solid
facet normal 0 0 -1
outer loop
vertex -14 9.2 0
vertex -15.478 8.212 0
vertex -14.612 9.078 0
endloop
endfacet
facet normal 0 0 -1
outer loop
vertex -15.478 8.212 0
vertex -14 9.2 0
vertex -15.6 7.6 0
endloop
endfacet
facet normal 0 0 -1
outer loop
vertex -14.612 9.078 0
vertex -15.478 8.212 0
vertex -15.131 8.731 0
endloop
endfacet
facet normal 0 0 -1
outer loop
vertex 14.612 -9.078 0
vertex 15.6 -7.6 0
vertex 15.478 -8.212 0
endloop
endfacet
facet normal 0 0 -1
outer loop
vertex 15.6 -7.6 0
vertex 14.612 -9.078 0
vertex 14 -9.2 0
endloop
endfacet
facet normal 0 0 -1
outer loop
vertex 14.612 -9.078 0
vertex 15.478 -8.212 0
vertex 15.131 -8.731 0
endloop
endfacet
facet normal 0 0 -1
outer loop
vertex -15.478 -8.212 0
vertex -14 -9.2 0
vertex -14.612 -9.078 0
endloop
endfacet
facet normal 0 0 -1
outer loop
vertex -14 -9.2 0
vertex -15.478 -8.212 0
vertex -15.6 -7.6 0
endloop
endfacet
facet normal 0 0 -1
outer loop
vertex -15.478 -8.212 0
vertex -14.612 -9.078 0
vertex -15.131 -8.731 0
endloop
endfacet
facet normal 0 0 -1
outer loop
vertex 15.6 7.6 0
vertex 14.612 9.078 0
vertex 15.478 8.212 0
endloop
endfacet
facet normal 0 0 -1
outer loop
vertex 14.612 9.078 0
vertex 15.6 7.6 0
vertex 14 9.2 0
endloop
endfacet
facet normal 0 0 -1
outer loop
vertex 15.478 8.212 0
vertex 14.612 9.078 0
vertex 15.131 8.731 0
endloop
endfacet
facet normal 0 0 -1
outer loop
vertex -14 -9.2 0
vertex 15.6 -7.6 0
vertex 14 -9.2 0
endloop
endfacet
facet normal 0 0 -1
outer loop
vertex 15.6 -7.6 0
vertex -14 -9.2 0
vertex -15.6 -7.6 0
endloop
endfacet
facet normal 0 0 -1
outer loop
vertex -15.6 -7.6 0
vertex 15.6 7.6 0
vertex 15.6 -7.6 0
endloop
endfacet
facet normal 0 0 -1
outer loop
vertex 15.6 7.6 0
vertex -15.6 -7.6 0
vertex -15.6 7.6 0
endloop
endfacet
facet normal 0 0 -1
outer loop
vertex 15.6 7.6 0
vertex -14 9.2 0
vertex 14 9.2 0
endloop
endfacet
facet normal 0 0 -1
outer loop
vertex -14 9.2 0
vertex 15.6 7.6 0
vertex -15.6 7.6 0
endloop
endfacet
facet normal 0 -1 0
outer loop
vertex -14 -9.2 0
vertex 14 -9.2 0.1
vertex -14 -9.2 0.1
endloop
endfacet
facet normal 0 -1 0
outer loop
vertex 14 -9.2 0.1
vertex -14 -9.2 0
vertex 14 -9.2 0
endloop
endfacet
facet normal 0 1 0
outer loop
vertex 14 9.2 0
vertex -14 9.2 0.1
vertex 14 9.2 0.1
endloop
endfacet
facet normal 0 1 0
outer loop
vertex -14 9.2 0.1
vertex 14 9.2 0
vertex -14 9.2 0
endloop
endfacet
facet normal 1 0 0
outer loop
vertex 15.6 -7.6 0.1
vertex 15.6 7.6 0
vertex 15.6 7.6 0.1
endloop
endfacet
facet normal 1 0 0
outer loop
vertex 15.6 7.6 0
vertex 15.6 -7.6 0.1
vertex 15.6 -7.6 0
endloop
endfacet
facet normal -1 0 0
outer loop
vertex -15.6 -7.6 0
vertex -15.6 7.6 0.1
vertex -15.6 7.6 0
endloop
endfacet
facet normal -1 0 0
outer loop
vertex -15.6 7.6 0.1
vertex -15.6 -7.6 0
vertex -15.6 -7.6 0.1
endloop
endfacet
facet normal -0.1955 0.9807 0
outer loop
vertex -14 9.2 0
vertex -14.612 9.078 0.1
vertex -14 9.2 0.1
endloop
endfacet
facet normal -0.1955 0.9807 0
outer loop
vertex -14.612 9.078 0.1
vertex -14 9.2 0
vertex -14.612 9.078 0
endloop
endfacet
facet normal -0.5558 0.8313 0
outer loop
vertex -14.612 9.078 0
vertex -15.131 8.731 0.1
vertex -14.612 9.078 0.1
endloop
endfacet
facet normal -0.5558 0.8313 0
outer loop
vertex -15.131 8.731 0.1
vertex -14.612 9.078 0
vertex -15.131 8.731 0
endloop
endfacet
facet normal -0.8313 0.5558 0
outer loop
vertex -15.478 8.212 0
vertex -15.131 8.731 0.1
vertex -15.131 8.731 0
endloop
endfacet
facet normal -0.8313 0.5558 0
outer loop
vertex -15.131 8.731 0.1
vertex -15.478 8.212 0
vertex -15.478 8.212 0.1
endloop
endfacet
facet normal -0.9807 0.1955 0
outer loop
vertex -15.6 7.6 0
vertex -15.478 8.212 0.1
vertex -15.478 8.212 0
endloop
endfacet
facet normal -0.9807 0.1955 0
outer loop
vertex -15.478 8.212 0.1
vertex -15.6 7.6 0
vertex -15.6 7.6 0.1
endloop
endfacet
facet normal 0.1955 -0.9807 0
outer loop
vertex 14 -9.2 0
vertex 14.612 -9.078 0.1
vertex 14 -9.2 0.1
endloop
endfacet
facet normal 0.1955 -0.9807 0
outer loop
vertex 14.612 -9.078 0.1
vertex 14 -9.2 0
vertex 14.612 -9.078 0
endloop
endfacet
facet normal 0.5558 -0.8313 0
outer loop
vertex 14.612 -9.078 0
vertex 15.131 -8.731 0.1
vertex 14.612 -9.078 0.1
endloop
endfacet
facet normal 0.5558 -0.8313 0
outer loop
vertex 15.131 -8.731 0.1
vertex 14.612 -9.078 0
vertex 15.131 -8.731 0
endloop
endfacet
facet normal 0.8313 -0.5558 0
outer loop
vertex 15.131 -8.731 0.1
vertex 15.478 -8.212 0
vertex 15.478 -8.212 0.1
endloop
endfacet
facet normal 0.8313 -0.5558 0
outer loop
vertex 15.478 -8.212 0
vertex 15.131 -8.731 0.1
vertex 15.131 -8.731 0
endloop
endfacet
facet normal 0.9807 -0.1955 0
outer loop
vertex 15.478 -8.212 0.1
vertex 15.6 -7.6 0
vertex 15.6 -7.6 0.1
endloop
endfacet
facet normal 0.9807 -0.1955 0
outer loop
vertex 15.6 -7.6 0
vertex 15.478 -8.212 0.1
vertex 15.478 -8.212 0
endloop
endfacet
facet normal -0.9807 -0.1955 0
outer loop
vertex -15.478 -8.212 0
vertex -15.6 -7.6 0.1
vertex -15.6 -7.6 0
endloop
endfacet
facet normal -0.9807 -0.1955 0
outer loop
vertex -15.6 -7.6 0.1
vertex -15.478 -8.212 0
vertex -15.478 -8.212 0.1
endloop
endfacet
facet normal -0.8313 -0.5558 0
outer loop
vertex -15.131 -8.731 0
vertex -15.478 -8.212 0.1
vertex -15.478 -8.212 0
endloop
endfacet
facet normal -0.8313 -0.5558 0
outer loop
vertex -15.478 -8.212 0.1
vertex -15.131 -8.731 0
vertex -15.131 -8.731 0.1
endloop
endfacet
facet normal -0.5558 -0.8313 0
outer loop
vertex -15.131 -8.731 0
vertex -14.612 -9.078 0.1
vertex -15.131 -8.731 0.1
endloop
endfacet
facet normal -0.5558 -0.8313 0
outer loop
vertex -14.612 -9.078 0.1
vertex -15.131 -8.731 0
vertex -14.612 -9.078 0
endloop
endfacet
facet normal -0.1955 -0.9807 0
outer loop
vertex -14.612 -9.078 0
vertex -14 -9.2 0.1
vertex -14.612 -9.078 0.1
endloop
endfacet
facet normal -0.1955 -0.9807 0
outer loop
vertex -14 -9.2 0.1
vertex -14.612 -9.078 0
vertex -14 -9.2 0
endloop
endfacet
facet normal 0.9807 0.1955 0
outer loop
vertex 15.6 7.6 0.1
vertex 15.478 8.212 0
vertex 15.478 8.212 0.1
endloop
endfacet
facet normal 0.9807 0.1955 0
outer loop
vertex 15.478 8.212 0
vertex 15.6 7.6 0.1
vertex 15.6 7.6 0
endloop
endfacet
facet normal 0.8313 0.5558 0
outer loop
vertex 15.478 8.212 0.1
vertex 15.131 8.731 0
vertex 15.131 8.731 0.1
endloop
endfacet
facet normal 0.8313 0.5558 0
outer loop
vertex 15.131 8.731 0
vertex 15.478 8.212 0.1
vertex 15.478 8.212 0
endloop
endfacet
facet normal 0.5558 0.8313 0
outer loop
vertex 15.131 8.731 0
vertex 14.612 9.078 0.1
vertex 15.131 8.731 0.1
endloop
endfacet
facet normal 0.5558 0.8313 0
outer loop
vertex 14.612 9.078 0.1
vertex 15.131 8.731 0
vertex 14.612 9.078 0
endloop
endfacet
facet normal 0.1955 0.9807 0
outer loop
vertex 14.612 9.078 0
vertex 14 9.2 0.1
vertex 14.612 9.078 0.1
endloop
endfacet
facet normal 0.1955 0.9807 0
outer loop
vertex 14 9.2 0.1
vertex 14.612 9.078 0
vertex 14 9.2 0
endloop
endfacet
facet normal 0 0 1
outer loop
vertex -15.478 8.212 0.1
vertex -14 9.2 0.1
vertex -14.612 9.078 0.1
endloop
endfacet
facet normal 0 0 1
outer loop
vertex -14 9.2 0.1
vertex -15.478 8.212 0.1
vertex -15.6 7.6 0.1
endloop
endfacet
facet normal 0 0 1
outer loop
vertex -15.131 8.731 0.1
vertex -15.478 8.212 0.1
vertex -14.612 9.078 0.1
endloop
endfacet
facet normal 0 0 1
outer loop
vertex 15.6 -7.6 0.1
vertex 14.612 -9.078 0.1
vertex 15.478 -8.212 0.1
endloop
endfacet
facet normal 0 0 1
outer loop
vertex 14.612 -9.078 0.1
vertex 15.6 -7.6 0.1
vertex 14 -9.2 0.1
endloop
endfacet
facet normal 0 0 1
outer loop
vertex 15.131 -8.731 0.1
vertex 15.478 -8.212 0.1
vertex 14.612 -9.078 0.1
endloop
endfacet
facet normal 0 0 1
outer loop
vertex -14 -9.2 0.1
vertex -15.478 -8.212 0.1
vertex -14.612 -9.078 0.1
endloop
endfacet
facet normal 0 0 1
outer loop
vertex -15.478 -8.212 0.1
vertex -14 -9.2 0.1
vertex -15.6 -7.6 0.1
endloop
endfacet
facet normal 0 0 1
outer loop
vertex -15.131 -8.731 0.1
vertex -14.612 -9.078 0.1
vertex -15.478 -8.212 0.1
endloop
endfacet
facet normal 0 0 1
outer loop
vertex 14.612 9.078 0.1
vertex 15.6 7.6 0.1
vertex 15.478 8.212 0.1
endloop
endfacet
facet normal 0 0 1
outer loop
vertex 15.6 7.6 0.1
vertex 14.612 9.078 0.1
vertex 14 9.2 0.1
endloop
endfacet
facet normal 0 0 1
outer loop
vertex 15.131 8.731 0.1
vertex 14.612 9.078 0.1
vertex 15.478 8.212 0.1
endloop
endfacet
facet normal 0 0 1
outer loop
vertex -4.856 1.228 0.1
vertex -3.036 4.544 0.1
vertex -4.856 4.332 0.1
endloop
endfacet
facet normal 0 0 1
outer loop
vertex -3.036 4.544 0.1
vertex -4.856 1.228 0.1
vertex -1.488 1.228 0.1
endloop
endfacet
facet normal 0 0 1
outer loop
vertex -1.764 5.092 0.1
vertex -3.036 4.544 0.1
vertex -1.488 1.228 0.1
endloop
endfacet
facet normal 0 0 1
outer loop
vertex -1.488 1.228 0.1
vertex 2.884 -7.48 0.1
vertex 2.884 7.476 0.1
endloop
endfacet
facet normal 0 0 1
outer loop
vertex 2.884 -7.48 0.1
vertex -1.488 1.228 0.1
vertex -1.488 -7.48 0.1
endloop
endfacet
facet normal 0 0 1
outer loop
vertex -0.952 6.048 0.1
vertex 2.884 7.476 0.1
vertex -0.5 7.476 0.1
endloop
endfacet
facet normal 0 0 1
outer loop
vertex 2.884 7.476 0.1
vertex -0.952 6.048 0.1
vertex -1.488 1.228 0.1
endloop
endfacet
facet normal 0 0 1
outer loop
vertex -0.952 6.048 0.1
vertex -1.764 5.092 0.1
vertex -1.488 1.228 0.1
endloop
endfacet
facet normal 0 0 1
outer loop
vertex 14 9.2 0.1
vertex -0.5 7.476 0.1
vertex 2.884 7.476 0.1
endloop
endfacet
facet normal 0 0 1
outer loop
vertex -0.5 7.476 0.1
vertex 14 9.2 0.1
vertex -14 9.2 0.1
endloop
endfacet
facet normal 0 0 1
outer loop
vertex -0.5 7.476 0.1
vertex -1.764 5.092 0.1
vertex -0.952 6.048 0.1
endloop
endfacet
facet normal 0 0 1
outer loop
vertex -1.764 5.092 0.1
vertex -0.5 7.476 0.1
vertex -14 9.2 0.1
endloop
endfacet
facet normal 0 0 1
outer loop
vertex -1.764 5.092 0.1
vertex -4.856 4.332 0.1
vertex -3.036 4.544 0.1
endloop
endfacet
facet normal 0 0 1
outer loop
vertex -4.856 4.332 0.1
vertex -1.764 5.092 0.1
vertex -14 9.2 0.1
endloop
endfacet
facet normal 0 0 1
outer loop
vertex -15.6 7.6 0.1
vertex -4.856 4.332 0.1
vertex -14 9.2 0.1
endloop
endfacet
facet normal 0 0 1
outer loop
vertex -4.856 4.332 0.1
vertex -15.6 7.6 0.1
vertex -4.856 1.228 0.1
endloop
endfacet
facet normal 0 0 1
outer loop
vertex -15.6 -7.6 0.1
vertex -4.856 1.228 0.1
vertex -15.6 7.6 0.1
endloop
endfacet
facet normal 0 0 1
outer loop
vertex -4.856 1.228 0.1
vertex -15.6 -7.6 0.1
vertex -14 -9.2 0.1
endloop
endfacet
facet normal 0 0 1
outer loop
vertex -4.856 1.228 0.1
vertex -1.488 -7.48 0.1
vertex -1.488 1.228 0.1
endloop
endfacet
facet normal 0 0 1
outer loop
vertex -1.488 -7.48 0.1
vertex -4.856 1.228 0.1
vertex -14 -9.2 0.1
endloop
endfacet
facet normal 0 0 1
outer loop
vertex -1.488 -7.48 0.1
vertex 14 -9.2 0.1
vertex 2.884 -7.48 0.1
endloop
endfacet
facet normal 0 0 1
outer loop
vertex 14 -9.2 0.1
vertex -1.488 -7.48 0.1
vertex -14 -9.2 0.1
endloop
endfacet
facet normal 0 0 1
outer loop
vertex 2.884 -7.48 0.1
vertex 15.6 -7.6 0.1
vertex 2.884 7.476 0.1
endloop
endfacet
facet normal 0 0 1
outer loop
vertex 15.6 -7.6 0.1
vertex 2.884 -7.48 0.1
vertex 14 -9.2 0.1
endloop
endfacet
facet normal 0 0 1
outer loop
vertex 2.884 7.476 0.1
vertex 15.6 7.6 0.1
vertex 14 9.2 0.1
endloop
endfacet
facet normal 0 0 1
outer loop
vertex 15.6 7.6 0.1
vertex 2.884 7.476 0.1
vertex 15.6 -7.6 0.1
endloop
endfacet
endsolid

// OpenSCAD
// file: ../p/1-4cyli.scad
use <../lib.scad>
function ldraw_lib__1_4cyli() = [
// 0 Cylinder 0.25
// 0 Name: 1-4cyli.dat
// 0 Author: James Jessiman
// 0 !LDRAW_ORG Primitive UPDATE 2012-01
// 0 !LICENSE Licensed under CC BY 2.0 and CC BY 4.0 : see CAreadme.txt
// 
// 0 BFC CERTIFY CCW
  [0,"BFC","CERTIFY"],
  [0,"BFC","CCW"],
// 
// 0 !HISTORY 2002-03-23 [sbliss] Added BFC statement.
// 0 !HISTORY 2002-04-25 [PTadmin] Official Update 2002-02
// 0 !HISTORY 2007-06-22 [PTadmin] Header formatted for Contributor Agreement
// 0 !HISTORY 2008-07-01 [PTadmin] Official Update 2008-01
// 0 !HISTORY 2012-02-16 [Philo] Changed to CCW
// 0 !HISTORY 2012-03-30 [PTadmin] Official Update 2012-01
// 
// 
// 4 16 1 1 0 0.9239 1 0.3827 0.9239 0 0.3827 1 0 0
  [4,16,1,1,0,0.9239,1,0.3827,0.9239,0,0.3827,1,0,0],
// 5 24 1 0 0 1 1 0 0.9239 0 0.3827 1 0 -1
  [5,24,1,0,0,1,1,0,0.9239,0,0.3827,1,0,-1],
// 4 16 0.9239 1 0.3827 0.7071 1 0.7071 0.7071 0 0.7071 0.9239 0 0.3827
  [4,16,0.9239,1,0.3827,0.7071,1,0.7071,0.7071,0,0.7071,0.9239,0,0.3827],
// 5 24 0.9239 0 0.3827 0.9239 1 0.3827 0.7071 0 0.7071 1 0 0
  [5,24,0.9239,0,0.3827,0.9239,1,0.3827,0.7071,0,0.7071,1,0,0],
// 4 16 0.7071 1 0.7071 0.3827 1 0.9239 0.3827 0 0.9239 0.7071 0 0.7071
  [4,16,0.7071,1,0.7071,0.3827,1,0.9239,0.3827,0,0.9239,0.7071,0,0.7071],
// 5 24 0.7071 0 0.7071 0.7071 1 0.7071 0.3827 0 0.9239 0.9239 0 0.3827
  [5,24,0.7071,0,0.7071,0.7071,1,0.7071,0.3827,0,0.9239,0.9239,0,0.3827],
// 4 16 0.3827 1 0.9239 0 1 1 0 0 1 0.3827 0 0.9239
  [4,16,0.3827,1,0.9239,0,1,1,0,0,1,0.3827,0,0.9239],
// 5 24 0.3827 0 0.9239 0.3827 1 0.9239 0 0 1 0.7071 0 0.7071
  [5,24,0.3827,0,0.9239,0.3827,1,0.9239,0,0,1,0.7071,0,0.7071],
// 5 24 0 0 1 0 1 1 0.3827 0 0.9239 -1 0 1
  [5,24,0,0,1,0,1,1,0.3827,0,0.9239,-1,0,1],
];
module ldraw_lib__1_4cyli(step=0, col=false, unit=2/5, alt=false, line=0.2, solid=!$preview)
    makepoly(ldraw_lib__1_4cyli(), step=step, col=col, unit=unit, alt=alt, line=line, solid=solid);
ldraw_lib__1_4cyli(line=0.2);
// file: ../p/1-4chrd.scad
use <../lib.scad>
function ldraw_lib__1_4chrd() = [
// 0 Chord 0.25
// 0 Name: 1-4chrd.dat
// 0 Author: Tony Hafner [hafhead]
// 0 !LDRAW_ORG Primitive UPDATE 2012-02
// 0 !LICENSE Licensed under CC BY 2.0 and CC BY 4.0 : see CAreadme.txt
// 
// 0 BFC CERTIFY CCW
  [0,"BFC","CERTIFY"],
  [0,"BFC","CCW"],
// 
// 0 !HISTORY 2004-04-22 [PTadmin] Official Update 2004-02
// 0 !HISTORY 2007-10-09 [PTadmin] Header formatted for Contributor Agreement
// 0 !HISTORY 2008-07-01 [PTadmin] Official Update 2008-01
// 0 !HISTORY 2012-08-02 [MMR1988] Re-creation with PrimGen2 and Rectifier
// 0 !HISTORY 2012-08-09 [PTadmin] Official Update 2012-02
// 
// 
// 4 16 0.9239 0 0.3827 0.3827 0 0.9239 0 0 1 1 0 0
  [4,16,0.9239,0,0.3827,0.3827,0,0.9239,0,0,1,1,0,0],
// 3 16 0.7071 0 0.7071 0.3827 0 0.9239 0.9239 0 0.3827
  [3,16,0.7071,0,0.7071,0.3827,0,0.9239,0.9239,0,0.3827],
];
module ldraw_lib__1_4chrd(step=0, col=false, unit=2/5, alt=false, line=0.2, solid=!$preview)
    makepoly(ldraw_lib__1_4chrd(), step=step, col=col, unit=unit, alt=alt, line=line, solid=solid);
ldraw_lib__1_4chrd(line=0.2);
// main file
use <../lib.scad>
use <../p/1-4chrd.scad>
use <../p/1-4cyli.scad>
function ldraw_lib__004462b() = [
// 0 Sticker  2.3 x  3.9 Rounded Rectangle with Black "1" on White Background
// 0 Name: 004462b.dat
// 0 Author: Takeshi Takahashi [RainbowDolphin]
// 0 !LDRAW_ORG Part UPDATE 2022-06
// 0 !LICENSE Licensed under CC BY 2.0 and CC BY 4.0 : see CAreadme.txt
// 
// 0 BFC CERTIFY CCW
  [0,"BFC","CERTIFY"],
  [0,"BFC","CCW"],
// 
// 0 !KEYWORDS Bricklink 392.1stk01, Brickowl 792264, Formula 1, Racer
// 0 !KEYWORDS Rebrickable 004462, Set 392-1
// 
// 0 !HISTORY 2022-12-20 [PTadmin] Official Update 2022-06
// 
// 
// 1 16 -35 0 19 0 0 -4 0 -1 0 4 0 0 1-4chrd.dat
  [1,16,-35,0,19,0,0,-4,0,-1,0,4,0,0, ldraw_lib__1_4chrd()],
// 1 16 35 0 -19 0 0 4 0 -1 0 -4 0 0 1-4chrd.dat
  [1,16,35,0,-19,0,0,4,0,-1,0,-4,0,0, ldraw_lib__1_4chrd()],
// 1 16 -35 0 -19 -4 0 0 0 -1 0 0 0 -4 1-4chrd.dat
  [1,16,-35,0,-19,-4,0,0,0,-1,0,0,0,-4, ldraw_lib__1_4chrd()],
// 1 16 35 0 19 4 0 0 0 -1 0 0 0 4 1-4chrd.dat
  [1,16,35,0,19,4,0,0,0,-1,0,0,0,4, ldraw_lib__1_4chrd()],
// 4 16 39 0 -19 35 0 -23 -35 0 -23 -39 0 -19
  [4,16,39,0,-19,35,0,-23,-35,0,-23,-39,0,-19],
// 4 16 39 0 19 39 0 -19 -39 0 -19 -39 0 19
  [4,16,39,0,19,39,0,-19,-39,0,-19,-39,0,19],
// 4 16 35 0 23 39 0 19 -39 0 19 -35 0 23
  [4,16,35,0,23,39,0,19,-39,0,19,-35,0,23],
// 4 16 -35 -.25 -23 -35 0 -23 35 0 -23 35 -.25 -23
  [4,16,-35,-.25,-23,-35,0,-23,35,0,-23,35,-.25,-23],
// 4 16 35 0 23 -35 0 23 -35 -.25 23 35 -.25 23
  [4,16,35,0,23,-35,0,23,-35,-.25,23,35,-.25,23],
// 4 16 39 -.25 -19 39 0 -19 39 0 19 39 -.25 19
  [4,16,39,-.25,-19,39,0,-19,39,0,19,39,-.25,19],
// 4 16 -39 0 19 -39 0 -19 -39 -.25 -19 -39 -.25 19
  [4,16,-39,0,19,-39,0,-19,-39,-.25,-19,-39,-.25,19],
// 
// 1 16 -35 0 19 0 0 -4 0 -0.25 0 4 0 0 1-4cyli.dat
  [1,16,-35,0,19,0,0,-4,0,-0.25,0,4,0,0, ldraw_lib__1_4cyli()],
// 1 16 35 0 -19 0 0 4 0 -0.25 0 -4 0 0 1-4cyli.dat
  [1,16,35,0,-19,0,0,4,0,-0.25,0,-4,0,0, ldraw_lib__1_4cyli()],
// 1 16 -35 0 -19 -4 0 0 0 -0.25 0 0 0 -4 1-4cyli.dat
  [1,16,-35,0,-19,-4,0,0,0,-0.25,0,0,0,-4, ldraw_lib__1_4cyli()],
// 1 16 35 0 19 4 0 0 0 -0.25 0 0 0 4 1-4cyli.dat
  [1,16,35,0,19,4,0,0,0,-0.25,0,0,0,4, ldraw_lib__1_4cyli()],
// 1 15 -35 -0.25 19 0 0 -4 0 1 0 4 0 0 1-4chrd.dat
  [1,15,-35,-0.25,19,0,0,-4,0,1,0,4,0,0, ldraw_lib__1_4chrd()],
// 1 15 35 -0.25 -19 0 0 4 0 1 0 -4 0 0 1-4chrd.dat
  [1,15,35,-0.25,-19,0,0,4,0,1,0,-4,0,0, ldraw_lib__1_4chrd()],
// 1 15 -35 -0.25 -19 -4 0 0 0 1 0 0 0 -4 1-4chrd.dat
  [1,15,-35,-0.25,-19,-4,0,0,0,1,0,0,0,-4, ldraw_lib__1_4chrd()],
// 1 15 35 -0.25 19 4 0 0 0 1 0 0 0 4 1-4chrd.dat
  [1,15,35,-0.25,19,4,0,0,0,1,0,0,0,4, ldraw_lib__1_4chrd()],
// 4 0 -12.14 -.25 3.07 -3.72 -.25 3.07 -7.59 -.25 11.36 -12.14 -.25 10.83
  [4,0,-12.14,-.25,3.07,-3.72,-.25,3.07,-7.59,-.25,11.36,-12.14,-.25,10.83],
// 3 0 -4.41 -.25 12.73 -7.59 -.25 11.36 -3.72 -.25 3.07
  [3,0,-4.41,-.25,12.73,-7.59,-.25,11.36,-3.72,-.25,3.07],
// 4 0 7.21 -.25 -18.7 7.21 -.25 18.69 -3.72 -.25 3.07 -3.72 -.25 -18.7
  [4,0,7.21,-.25,-18.7,7.21,-.25,18.69,-3.72,-.25,3.07,-3.72,-.25,-18.7],
// 4 0 7.21 -.25 18.69 -1.25 -.25 18.69 -2.38 -.25 15.12 -3.72 -.25 3.07
  [4,0,7.21,-.25,18.69,-1.25,-.25,18.69,-2.38,-.25,15.12,-3.72,-.25,3.07],
// 3 0 -2.38 -.25 15.12 -4.41 -.25 12.73 -3.72 -.25 3.07
  [3,0,-2.38,-.25,15.12,-4.41,-.25,12.73,-3.72,-.25,3.07],
// 4 15 35 -.25 23 -35 -.25 23 -1.25 -.25 18.69 7.21 -.25 18.69
  [4,15,35,-.25,23,-35,-.25,23,-1.25,-.25,18.69,7.21,-.25,18.69],
// 4 15 -2.38 -.25 15.12 -1.25 -.25 18.69 -35 -.25 23 -4.41 -.25 12.73
  [4,15,-2.38,-.25,15.12,-1.25,-.25,18.69,-35,-.25,23,-4.41,-.25,12.73],
// 4 15 -7.59 -.25 11.36 -4.41 -.25 12.73 -35 -.25 23 -12.14 -.25 10.83
  [4,15,-7.59,-.25,11.36,-4.41,-.25,12.73,-35,-.25,23,-12.14,-.25,10.83],
// 4 15 -12.14 -.25 10.83 -35 -.25 23 -39 -.25 19 -12.14 -.25 3.07
  [4,15,-12.14,-.25,10.83,-35,-.25,23,-39,-.25,19,-12.14,-.25,3.07],
// 4 15 -12.14 -.25 3.07 -39 -.25 19 -39 -.25 -19 -35 -.25 -23
  [4,15,-12.14,-.25,3.07,-39,-.25,19,-39,-.25,-19,-35,-.25,-23],
// 4 15 -3.72 -.25 3.07 -12.14 -.25 3.07 -35 -.25 -23 -3.72 -.25 -18.7
  [4,15,-3.72,-.25,3.07,-12.14,-.25,3.07,-35,-.25,-23,-3.72,-.25,-18.7],
// 4 15 -3.72 -.25 -18.7 -35 -.25 -23 35 -.25 -23 7.21 -.25 -18.7
  [4,15,-3.72,-.25,-18.7,-35,-.25,-23,35,-.25,-23,7.21,-.25,-18.7],
// 4 15 7.21 -.25 -18.7 35 -.25 -23 39 -.25 -19 7.21 -.25 18.69
  [4,15,7.21,-.25,-18.7,35,-.25,-23,39,-.25,-19,7.21,-.25,18.69],
// 4 15 7.21 -.25 18.69 39 -.25 -19 39 -.25 19 35 -.25 23
  [4,15,7.21,-.25,18.69,39,-.25,-19,39,-.25,19,35,-.25,23],
];
module ldraw_lib__004462b(step=0, col=false, unit=2/5, alt=false, line=0.2, solid=!$preview)
    makepoly(ldraw_lib__004462b(), step=step, col=col, unit=unit, alt=alt, line=line, solid=solid);
ldraw_lib__004462b(line=0.2);
